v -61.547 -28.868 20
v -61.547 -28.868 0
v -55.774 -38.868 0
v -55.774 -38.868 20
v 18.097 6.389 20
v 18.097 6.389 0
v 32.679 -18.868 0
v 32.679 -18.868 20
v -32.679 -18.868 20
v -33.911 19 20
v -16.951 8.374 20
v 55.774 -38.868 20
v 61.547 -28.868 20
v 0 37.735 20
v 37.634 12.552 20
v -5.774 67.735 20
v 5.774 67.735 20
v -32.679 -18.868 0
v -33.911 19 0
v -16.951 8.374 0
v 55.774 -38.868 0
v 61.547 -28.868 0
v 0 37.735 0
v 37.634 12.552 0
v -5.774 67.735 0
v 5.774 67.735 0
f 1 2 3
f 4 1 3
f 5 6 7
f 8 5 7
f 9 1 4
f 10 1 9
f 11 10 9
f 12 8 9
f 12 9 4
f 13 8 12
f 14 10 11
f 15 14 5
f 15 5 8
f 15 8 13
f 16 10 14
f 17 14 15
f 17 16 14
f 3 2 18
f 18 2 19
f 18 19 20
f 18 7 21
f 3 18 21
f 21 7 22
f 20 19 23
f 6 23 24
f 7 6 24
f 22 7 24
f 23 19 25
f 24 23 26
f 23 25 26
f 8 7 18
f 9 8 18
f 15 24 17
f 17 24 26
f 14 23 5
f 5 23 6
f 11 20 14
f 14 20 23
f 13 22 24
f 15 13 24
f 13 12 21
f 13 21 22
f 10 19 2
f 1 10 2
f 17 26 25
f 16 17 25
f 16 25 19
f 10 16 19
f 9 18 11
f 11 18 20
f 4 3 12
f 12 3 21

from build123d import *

# Parameters (mm, degrees)
EXTRUDE_4_DEPTH = 20


with BuildPart() as part:
    # 草图7 → 凸台-拉伸4 (new body)
    with BuildSketch(Plane.XY):
        Polygon((-33.910919067, 18.999592163), (-61.547005384, -28.867513459), (-55.773502692, -38.867513459), (1.462534319, -38.867513459), (55.773502692, -38.867513459), (61.547005384, -28.867513459), (37.633660722, 12.551614473), (5.773502692, 67.735026919), (-5.773502692, 67.735026919), align=None)
        Polygon((-16.951439693, 8.374272109), (0, 37.735026919), (18.097391255, 6.389425782), (32.679491924, -18.867513459), (0.821995205, -18.867513459), (-32.679491924, -18.867513459), align=None, mode=Mode.SUBTRACT)
    extrude(amount=EXTRUDE_4_DEPTH)


solid = part.part
